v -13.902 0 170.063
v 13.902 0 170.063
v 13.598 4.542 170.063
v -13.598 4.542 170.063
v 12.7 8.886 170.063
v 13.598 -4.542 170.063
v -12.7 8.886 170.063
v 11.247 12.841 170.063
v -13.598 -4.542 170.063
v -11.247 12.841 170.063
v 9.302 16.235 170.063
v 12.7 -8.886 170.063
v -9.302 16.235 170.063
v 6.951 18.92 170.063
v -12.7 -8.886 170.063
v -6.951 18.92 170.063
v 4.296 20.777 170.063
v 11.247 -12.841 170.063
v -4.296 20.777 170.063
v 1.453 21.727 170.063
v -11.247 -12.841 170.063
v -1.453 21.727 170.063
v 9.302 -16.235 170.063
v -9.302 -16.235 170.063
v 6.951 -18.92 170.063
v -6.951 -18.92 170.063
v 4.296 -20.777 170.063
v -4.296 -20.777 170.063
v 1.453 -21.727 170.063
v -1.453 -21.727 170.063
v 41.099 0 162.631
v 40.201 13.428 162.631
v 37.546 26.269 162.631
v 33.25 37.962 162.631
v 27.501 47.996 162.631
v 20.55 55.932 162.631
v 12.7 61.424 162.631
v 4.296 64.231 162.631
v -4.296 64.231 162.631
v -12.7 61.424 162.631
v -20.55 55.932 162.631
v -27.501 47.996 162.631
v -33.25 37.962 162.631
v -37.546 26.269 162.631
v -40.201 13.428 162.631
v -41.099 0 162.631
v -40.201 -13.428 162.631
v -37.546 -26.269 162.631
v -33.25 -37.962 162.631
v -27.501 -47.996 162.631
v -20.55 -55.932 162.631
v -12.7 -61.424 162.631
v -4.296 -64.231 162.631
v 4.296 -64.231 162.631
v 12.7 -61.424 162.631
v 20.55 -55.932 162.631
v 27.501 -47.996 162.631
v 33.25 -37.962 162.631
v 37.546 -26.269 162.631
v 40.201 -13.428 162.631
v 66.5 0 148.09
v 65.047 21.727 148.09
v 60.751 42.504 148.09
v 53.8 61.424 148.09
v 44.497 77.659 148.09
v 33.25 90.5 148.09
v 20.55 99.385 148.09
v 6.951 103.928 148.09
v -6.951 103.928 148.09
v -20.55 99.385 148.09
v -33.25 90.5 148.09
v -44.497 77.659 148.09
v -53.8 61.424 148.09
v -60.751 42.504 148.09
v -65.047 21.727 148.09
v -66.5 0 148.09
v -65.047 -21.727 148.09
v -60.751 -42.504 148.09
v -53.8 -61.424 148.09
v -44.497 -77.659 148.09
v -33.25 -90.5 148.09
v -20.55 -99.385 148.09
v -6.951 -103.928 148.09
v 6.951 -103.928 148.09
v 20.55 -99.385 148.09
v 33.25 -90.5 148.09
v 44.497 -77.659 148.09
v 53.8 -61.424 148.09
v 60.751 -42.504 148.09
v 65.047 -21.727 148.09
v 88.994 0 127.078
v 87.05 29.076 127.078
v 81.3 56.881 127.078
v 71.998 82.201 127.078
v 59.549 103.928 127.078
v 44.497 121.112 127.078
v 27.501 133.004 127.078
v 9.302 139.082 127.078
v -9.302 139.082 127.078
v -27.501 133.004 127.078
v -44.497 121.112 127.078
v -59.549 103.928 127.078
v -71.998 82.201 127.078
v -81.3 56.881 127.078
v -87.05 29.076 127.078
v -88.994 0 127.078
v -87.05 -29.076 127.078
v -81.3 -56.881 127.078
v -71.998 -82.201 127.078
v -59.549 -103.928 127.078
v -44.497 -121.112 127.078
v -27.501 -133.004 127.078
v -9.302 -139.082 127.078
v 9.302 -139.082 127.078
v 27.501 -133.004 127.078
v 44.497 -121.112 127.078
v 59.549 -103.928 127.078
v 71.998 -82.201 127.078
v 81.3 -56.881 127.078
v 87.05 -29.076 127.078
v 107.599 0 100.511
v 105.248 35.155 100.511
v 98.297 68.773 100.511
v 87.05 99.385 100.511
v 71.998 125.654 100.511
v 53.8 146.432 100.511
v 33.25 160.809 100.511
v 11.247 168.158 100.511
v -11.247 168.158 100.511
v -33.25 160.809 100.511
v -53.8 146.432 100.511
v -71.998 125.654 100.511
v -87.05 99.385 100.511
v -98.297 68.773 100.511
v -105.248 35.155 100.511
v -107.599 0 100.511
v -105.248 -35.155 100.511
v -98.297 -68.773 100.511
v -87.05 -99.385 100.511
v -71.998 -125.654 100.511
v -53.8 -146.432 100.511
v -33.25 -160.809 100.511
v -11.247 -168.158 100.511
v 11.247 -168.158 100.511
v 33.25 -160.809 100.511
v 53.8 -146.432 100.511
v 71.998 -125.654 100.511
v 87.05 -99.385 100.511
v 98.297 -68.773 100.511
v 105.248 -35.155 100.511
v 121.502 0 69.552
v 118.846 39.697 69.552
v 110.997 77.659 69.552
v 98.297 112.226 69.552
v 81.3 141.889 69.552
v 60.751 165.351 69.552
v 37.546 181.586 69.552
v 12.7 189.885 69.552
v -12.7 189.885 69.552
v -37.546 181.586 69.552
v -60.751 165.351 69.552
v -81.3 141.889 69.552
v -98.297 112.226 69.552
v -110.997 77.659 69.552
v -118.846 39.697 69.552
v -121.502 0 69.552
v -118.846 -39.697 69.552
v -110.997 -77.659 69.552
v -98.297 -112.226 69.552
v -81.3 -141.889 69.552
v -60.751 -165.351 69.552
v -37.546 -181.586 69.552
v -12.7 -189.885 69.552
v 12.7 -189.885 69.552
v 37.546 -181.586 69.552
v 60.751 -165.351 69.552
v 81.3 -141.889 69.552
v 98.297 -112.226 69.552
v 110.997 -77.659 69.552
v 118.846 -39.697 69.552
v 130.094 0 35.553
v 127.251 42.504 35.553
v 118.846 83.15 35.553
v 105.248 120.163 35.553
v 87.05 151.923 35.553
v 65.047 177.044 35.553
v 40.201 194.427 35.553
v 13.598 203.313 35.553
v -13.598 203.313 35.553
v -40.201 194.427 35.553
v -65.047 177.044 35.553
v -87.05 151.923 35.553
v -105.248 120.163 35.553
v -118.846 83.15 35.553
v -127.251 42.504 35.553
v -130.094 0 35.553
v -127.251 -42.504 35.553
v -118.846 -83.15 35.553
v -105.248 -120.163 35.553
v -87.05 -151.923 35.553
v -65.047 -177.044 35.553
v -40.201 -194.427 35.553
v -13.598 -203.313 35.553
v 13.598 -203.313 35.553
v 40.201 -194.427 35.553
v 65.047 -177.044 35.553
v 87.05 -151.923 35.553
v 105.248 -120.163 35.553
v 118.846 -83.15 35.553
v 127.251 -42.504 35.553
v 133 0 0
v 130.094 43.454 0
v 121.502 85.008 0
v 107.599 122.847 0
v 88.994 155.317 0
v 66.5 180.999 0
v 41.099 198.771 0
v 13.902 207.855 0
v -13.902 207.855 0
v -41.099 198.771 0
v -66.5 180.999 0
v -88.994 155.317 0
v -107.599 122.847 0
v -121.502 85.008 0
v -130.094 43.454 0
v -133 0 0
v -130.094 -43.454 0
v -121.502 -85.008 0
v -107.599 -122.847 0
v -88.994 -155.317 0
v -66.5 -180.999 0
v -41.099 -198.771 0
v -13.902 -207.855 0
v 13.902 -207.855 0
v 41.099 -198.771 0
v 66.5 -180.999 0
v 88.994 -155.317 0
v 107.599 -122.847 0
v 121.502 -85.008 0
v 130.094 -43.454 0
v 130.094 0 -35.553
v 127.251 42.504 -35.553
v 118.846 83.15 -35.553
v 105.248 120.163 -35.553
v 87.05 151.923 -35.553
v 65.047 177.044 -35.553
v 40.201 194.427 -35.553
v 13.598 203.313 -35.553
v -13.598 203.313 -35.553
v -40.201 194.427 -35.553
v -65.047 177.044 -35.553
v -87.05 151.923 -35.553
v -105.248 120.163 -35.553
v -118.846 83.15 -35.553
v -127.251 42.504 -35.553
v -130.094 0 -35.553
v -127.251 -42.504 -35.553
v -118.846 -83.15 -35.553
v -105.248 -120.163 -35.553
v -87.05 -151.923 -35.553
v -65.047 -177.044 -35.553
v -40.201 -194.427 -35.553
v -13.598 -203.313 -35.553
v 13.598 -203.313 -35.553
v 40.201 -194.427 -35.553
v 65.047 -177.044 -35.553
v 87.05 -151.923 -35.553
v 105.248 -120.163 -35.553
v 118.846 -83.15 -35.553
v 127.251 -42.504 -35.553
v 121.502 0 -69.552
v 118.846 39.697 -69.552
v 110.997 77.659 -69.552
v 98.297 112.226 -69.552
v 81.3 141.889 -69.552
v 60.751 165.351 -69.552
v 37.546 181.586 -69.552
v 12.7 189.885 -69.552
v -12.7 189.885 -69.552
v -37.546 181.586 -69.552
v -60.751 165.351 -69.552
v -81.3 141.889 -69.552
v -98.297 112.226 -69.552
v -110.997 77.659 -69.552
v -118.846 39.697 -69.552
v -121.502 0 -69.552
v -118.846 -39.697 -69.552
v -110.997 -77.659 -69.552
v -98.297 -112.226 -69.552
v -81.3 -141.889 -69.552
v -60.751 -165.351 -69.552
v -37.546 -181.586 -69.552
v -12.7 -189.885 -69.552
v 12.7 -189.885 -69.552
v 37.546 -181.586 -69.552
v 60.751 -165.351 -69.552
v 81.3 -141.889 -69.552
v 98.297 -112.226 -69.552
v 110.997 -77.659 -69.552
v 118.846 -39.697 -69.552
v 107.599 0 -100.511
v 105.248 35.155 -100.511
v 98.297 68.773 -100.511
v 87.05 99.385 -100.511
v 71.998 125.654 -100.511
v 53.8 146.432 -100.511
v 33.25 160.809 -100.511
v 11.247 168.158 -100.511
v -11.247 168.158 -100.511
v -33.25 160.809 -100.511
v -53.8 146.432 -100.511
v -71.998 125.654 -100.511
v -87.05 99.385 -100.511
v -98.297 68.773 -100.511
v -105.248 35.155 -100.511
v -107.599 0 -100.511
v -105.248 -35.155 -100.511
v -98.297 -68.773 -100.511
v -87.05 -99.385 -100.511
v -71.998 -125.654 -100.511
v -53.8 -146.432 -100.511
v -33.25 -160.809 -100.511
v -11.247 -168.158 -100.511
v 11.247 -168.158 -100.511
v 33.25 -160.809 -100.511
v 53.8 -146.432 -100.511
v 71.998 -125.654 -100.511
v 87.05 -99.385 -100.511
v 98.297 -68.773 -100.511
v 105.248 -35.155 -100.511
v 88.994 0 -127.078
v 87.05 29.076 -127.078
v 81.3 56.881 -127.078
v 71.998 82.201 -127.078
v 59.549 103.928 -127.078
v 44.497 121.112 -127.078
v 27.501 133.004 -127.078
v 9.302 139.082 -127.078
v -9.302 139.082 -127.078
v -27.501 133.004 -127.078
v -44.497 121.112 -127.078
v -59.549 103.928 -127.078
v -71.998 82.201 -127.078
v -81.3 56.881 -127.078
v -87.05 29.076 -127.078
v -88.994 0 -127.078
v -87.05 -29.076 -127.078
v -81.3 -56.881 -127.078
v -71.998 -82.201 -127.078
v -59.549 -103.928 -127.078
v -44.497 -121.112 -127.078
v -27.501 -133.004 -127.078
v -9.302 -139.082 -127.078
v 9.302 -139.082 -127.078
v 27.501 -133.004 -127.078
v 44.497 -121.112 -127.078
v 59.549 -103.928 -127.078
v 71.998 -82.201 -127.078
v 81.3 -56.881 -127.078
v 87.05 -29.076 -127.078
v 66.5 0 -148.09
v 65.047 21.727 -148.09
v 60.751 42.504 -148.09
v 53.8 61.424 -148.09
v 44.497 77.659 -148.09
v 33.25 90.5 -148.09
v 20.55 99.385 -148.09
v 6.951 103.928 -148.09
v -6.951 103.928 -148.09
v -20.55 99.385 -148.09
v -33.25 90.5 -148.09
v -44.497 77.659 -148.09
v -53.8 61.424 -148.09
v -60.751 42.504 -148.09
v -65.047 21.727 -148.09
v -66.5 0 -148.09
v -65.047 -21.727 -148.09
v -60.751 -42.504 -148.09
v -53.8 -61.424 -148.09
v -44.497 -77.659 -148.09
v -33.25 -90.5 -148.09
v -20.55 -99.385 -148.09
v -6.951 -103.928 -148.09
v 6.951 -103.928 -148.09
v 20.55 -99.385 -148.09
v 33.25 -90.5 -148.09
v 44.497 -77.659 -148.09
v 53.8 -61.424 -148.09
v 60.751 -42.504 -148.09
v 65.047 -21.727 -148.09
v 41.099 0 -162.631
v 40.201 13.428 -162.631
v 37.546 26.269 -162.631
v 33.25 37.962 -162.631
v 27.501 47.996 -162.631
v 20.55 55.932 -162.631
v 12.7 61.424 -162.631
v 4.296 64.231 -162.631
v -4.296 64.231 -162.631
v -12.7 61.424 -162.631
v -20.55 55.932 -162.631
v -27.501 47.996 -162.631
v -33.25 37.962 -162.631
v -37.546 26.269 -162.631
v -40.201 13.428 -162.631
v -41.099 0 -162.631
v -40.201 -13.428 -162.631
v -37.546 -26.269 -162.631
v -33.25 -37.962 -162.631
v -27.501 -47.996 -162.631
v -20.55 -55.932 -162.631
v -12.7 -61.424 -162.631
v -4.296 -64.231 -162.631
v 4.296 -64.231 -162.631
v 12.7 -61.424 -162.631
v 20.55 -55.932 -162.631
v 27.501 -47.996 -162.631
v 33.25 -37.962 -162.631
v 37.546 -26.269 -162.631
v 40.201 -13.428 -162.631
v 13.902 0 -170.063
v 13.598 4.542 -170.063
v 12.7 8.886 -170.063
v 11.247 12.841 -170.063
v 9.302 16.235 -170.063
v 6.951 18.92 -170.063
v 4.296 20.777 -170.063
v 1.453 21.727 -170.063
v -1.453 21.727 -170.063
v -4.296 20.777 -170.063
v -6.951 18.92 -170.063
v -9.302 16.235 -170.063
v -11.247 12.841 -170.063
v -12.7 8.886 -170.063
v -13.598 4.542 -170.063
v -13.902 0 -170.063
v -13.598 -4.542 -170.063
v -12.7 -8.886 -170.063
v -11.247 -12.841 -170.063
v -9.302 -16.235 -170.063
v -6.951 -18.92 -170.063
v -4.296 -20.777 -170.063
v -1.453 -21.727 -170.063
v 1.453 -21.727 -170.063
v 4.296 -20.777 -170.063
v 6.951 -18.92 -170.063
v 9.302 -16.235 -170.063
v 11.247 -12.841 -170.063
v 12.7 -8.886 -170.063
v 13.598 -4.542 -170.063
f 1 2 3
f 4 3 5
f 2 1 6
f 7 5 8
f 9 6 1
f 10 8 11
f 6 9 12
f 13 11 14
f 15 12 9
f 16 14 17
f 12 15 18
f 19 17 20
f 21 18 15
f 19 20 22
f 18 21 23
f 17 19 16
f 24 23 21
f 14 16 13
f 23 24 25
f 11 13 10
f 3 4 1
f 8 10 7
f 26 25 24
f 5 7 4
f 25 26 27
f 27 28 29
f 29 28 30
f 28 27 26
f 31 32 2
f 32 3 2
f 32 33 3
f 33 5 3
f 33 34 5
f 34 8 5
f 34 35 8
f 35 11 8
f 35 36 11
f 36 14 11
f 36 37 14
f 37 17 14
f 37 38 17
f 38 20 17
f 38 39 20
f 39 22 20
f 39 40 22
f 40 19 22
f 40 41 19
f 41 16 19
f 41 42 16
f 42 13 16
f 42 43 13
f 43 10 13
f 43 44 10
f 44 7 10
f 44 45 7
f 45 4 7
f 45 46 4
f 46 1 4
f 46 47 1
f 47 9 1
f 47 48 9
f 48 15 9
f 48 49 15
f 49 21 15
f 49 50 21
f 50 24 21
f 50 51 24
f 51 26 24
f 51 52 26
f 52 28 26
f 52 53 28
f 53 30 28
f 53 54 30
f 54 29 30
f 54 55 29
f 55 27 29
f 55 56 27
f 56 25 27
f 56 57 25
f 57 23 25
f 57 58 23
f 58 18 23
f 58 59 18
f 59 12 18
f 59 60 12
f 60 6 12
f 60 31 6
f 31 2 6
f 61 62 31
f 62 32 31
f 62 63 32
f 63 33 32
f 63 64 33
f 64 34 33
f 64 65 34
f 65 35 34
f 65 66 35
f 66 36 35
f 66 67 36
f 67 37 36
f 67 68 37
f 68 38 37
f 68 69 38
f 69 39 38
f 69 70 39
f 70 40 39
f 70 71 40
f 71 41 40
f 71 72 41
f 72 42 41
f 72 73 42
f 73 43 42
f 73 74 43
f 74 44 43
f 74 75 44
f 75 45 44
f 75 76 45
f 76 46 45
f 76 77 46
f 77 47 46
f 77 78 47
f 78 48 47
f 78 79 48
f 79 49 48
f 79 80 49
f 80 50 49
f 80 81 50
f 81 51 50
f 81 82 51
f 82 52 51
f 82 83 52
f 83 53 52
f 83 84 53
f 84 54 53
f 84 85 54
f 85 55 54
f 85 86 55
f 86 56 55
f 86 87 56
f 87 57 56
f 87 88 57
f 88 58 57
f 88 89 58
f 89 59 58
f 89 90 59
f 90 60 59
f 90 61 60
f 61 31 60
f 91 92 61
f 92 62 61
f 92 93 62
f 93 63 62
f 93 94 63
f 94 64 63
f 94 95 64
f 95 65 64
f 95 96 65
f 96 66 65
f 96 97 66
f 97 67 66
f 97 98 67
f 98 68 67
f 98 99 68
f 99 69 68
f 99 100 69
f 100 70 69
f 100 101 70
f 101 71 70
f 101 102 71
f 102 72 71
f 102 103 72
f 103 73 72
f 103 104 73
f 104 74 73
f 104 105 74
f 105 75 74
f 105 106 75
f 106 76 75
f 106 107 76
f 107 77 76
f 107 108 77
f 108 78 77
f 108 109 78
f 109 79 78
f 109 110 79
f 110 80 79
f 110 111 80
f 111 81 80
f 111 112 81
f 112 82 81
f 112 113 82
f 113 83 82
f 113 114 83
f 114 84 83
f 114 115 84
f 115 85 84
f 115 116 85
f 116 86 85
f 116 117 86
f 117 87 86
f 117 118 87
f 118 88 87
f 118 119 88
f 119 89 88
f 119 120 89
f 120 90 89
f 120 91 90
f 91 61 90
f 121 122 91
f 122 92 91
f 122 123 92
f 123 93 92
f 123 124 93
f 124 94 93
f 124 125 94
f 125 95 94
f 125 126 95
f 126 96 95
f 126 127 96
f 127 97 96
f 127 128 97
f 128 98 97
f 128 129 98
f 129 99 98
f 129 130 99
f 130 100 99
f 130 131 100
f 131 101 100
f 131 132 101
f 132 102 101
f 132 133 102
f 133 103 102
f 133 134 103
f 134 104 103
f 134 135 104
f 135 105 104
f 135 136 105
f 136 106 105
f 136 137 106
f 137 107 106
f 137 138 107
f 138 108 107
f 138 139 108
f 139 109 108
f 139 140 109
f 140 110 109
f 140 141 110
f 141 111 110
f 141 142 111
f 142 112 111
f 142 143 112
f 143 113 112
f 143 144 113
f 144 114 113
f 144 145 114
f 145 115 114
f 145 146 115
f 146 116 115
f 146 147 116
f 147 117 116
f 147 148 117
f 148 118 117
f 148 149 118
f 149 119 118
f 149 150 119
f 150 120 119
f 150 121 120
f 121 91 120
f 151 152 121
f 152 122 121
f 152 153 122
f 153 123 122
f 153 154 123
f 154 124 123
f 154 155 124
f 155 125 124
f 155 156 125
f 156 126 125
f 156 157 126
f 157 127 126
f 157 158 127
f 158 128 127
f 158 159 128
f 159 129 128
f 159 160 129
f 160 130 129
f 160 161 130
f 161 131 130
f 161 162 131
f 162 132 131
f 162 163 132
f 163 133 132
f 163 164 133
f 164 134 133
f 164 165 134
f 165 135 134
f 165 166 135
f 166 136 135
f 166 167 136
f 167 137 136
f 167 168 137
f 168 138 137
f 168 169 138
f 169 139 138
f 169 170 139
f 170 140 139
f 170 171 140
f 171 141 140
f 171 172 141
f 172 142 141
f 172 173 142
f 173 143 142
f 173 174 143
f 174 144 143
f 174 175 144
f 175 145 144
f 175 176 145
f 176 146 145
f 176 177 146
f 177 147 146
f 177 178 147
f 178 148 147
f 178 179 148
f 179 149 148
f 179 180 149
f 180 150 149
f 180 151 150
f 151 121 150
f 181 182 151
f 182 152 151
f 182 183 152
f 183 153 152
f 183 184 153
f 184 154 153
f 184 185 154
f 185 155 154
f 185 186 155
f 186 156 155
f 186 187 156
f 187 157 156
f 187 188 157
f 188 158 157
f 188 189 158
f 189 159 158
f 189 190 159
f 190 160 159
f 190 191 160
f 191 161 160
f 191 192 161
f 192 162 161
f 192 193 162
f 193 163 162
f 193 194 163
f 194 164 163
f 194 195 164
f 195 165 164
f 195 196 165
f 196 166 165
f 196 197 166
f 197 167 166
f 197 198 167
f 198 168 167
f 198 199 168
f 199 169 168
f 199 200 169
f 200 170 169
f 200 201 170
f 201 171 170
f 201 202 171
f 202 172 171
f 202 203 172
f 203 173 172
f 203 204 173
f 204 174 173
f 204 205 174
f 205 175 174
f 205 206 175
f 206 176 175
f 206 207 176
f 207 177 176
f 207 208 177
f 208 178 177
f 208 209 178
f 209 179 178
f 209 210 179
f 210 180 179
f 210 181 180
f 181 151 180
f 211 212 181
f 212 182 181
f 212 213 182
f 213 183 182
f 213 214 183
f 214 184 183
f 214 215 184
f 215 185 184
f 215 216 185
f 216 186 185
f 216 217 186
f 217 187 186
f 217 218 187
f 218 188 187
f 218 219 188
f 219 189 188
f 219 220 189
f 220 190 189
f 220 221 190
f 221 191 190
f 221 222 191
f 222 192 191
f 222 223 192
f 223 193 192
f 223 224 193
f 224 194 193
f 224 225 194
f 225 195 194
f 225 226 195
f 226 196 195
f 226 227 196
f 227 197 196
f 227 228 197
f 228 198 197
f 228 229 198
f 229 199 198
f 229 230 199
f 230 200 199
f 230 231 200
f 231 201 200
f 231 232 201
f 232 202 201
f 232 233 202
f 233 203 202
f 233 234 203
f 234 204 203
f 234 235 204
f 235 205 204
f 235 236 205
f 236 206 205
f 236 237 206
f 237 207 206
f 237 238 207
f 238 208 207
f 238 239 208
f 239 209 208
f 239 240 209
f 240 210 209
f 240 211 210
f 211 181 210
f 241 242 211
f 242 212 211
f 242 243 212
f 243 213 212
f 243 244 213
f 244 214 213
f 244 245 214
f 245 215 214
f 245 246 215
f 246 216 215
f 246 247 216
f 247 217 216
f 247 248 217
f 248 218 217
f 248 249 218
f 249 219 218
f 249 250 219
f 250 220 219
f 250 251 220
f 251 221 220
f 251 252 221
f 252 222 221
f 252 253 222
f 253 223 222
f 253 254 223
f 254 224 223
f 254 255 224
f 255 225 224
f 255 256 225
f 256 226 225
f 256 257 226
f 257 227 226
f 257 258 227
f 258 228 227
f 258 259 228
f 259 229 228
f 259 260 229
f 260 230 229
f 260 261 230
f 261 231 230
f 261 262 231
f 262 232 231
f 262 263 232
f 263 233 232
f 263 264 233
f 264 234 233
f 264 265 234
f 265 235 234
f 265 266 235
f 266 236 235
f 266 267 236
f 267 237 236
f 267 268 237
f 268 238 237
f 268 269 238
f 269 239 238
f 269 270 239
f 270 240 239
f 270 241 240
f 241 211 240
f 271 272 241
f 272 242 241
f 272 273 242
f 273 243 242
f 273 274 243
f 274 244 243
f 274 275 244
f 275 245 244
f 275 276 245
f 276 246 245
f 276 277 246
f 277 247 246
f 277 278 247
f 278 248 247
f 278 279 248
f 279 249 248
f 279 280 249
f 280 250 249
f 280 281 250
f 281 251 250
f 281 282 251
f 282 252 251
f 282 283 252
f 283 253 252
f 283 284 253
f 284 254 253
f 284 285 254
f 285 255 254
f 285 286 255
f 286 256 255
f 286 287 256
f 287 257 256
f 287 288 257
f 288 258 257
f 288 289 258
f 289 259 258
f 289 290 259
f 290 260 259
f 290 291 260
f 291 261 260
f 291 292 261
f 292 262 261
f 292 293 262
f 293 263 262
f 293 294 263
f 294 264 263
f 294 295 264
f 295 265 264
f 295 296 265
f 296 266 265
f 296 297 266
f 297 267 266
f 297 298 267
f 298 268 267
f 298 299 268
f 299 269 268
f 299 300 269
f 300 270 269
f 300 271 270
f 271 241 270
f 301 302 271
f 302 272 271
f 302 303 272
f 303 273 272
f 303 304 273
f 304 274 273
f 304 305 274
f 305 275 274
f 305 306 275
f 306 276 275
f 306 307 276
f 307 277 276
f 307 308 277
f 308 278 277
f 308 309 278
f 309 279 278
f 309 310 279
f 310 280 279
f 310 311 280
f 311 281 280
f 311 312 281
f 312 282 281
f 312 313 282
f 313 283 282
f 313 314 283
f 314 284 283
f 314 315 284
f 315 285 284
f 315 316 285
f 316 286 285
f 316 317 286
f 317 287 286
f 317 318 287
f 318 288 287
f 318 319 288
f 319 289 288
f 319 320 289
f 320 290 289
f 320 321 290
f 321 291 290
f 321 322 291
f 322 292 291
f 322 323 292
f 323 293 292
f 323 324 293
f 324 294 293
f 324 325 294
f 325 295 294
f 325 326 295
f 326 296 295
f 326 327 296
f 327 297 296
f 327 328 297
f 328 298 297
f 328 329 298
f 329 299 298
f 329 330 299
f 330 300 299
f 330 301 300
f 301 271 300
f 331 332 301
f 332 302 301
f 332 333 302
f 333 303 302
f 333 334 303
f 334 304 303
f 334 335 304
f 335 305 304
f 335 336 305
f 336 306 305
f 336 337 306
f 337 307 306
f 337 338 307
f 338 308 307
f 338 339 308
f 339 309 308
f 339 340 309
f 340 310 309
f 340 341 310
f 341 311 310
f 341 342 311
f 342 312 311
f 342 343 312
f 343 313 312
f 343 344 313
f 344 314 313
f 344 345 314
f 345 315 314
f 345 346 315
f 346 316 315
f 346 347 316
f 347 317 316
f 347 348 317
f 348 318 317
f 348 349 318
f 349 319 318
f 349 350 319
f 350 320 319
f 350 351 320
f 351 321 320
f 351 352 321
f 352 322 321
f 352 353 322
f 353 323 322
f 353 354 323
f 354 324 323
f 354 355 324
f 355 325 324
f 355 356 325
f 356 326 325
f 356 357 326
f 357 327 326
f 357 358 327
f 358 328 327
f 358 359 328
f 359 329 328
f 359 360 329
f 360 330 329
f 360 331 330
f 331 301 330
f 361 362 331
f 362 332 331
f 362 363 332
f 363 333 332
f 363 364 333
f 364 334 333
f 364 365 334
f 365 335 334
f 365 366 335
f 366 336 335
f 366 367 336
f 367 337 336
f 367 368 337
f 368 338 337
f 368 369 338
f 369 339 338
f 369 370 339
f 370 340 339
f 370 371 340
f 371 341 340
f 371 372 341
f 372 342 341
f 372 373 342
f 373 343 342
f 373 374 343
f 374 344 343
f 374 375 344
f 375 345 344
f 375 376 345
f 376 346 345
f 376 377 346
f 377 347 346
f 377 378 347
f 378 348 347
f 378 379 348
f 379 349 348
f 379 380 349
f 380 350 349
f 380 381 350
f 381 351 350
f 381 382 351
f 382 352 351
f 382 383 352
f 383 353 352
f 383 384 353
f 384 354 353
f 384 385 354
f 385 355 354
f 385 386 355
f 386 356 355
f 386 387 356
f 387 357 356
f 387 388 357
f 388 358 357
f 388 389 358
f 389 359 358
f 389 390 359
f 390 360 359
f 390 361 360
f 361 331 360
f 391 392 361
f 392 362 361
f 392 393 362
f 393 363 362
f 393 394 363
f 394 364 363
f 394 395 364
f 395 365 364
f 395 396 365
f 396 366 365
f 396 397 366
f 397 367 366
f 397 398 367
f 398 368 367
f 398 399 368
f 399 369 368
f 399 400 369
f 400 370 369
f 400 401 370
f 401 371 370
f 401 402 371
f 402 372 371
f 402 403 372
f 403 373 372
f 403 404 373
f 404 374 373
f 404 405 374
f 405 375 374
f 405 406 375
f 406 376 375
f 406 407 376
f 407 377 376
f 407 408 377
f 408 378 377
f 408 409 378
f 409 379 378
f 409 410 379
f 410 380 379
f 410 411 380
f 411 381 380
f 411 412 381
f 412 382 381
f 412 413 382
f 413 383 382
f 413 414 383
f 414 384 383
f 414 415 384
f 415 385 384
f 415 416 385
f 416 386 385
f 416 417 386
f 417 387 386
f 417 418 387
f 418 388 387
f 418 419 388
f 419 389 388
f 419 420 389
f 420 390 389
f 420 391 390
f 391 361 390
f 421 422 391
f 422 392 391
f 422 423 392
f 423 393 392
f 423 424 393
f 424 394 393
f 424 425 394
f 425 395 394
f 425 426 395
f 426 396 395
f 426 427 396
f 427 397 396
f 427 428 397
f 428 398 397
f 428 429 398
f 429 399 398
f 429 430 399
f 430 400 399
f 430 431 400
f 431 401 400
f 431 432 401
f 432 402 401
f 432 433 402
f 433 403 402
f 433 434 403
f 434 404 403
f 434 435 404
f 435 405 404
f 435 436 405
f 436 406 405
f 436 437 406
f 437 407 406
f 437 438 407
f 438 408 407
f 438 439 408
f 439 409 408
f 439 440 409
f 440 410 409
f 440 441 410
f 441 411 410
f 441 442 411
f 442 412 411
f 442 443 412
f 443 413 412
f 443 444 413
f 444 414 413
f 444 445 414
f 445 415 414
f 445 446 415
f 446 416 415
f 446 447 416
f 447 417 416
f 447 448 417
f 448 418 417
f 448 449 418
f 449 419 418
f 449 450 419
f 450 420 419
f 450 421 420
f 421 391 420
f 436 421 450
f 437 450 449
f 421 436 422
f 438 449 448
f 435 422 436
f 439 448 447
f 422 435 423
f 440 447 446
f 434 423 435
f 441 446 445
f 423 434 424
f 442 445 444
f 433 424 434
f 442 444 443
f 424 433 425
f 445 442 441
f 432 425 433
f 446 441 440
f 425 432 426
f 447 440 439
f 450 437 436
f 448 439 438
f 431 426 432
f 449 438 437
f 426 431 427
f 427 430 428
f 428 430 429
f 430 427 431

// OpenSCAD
// Generated by SolidPython 1.0.1 on 2020-07-29 00:46:47


scale(v = [7, 11, 9]) {
	sphere(r = 19);
}
/***********************************************
*********      SolidPython code:      **********
************************************************
 
# import packages: SolidPython
from solid import *
from solid.utils import *
from itertools import chain, combinations, permutations


class Resize:

    def __init__(self, scad_file):
        self.scad_file = scad_file
        #self.scad_file = import_scad(scad_file)
        # cone/cylinder param:
        self.r1 = 0
        self.r2 = 0
        self.h = 0
        # rectangular prism param:
        self.w = 0
        self.l = 0
        # ellipse param:
        self.r = 0

    # import OpenScad code (file name corresponds to shape)


    # classify shape + parameters
    def assign(self, param1, param2, param3):
        if self.scad_file == 'cone.scad':
            self.r1 = param1
            self.r2 = param2
            self.h = param3
        elif self.scad_file == 'cylinder.scad':
            self.r1 = param1
            self.r2 = param2
            self.h = param3
        elif self.scad_file == 'rectangularPrism.scad':
            self.h = param1
            self.l = param2
            self.w = param3
        else:
            self.r = param1
            self.h = param2

    # resize parameters
    def iterate(self):
        x = range(3, 20, 2)
        i = 1
        if self.scad_file == 'cone.scad':
            tempList = list(permutations(x, 2))
            for temp in tempList:
                param1 = temp[0]
                param2 = temp[1]
                filepath = 'produced_scad_files/' + 'cone' + str(param1) + '_' + str(param2) + '_' + '.scad'
                scad_render_to_file(cylinder(h=param1, r1=param2, r2=0), filepath)

        elif self.scad_file == 'cylinder.scad':
            tempList = list(permutations(x, 3))
            for temp in tempList:
                param1 = temp[0]
                param2 = temp[1]
                filepath = 'produced_scad_files/' + 'cylinder' + str(param1) + '_' + str(param2) + '_' + '.scad'
                scad_render_to_file(cylinder(h=param1, r1=param2, r2=param2), filepath)

        elif self.scad_file == 'rectangularPrism.scad':
            tempList = list(permutations(x, 3))
            for temp in tempList:
                param1 = temp[0]
                param2 = temp[1]
                param3 = temp[2]
                filepath = 'produced_scad_files/' + 'rectangularPrism' + str(param1) + '_' + str(param2) + '_' + str(
                    param3) + '.scad'
                scad_render_to_file(cube(size=(param1, param2, param3)), filepath)

        elif self.scad_file == 'ellipse.scad':
            tempList = list(permutations(x, 4))
            for temp in tempList:
                param1 = temp[0]
                param2 = temp[1]
                param3 = temp[2]
                param4 = temp[3]
                filepath = 'produced_scad_files/' + 'ellipse' + str(param1) + '_' + str(param2) + '_' + str(param3) + '_' + str(param4) + '.scad'
                scad_render_to_file(scale([param1, param2, param3])(sphere(r=param4)), filepath)

    def render_to_scadfile(self):
        scad_render_to_file(scad, 'example.scad') 
 
************************************************/
